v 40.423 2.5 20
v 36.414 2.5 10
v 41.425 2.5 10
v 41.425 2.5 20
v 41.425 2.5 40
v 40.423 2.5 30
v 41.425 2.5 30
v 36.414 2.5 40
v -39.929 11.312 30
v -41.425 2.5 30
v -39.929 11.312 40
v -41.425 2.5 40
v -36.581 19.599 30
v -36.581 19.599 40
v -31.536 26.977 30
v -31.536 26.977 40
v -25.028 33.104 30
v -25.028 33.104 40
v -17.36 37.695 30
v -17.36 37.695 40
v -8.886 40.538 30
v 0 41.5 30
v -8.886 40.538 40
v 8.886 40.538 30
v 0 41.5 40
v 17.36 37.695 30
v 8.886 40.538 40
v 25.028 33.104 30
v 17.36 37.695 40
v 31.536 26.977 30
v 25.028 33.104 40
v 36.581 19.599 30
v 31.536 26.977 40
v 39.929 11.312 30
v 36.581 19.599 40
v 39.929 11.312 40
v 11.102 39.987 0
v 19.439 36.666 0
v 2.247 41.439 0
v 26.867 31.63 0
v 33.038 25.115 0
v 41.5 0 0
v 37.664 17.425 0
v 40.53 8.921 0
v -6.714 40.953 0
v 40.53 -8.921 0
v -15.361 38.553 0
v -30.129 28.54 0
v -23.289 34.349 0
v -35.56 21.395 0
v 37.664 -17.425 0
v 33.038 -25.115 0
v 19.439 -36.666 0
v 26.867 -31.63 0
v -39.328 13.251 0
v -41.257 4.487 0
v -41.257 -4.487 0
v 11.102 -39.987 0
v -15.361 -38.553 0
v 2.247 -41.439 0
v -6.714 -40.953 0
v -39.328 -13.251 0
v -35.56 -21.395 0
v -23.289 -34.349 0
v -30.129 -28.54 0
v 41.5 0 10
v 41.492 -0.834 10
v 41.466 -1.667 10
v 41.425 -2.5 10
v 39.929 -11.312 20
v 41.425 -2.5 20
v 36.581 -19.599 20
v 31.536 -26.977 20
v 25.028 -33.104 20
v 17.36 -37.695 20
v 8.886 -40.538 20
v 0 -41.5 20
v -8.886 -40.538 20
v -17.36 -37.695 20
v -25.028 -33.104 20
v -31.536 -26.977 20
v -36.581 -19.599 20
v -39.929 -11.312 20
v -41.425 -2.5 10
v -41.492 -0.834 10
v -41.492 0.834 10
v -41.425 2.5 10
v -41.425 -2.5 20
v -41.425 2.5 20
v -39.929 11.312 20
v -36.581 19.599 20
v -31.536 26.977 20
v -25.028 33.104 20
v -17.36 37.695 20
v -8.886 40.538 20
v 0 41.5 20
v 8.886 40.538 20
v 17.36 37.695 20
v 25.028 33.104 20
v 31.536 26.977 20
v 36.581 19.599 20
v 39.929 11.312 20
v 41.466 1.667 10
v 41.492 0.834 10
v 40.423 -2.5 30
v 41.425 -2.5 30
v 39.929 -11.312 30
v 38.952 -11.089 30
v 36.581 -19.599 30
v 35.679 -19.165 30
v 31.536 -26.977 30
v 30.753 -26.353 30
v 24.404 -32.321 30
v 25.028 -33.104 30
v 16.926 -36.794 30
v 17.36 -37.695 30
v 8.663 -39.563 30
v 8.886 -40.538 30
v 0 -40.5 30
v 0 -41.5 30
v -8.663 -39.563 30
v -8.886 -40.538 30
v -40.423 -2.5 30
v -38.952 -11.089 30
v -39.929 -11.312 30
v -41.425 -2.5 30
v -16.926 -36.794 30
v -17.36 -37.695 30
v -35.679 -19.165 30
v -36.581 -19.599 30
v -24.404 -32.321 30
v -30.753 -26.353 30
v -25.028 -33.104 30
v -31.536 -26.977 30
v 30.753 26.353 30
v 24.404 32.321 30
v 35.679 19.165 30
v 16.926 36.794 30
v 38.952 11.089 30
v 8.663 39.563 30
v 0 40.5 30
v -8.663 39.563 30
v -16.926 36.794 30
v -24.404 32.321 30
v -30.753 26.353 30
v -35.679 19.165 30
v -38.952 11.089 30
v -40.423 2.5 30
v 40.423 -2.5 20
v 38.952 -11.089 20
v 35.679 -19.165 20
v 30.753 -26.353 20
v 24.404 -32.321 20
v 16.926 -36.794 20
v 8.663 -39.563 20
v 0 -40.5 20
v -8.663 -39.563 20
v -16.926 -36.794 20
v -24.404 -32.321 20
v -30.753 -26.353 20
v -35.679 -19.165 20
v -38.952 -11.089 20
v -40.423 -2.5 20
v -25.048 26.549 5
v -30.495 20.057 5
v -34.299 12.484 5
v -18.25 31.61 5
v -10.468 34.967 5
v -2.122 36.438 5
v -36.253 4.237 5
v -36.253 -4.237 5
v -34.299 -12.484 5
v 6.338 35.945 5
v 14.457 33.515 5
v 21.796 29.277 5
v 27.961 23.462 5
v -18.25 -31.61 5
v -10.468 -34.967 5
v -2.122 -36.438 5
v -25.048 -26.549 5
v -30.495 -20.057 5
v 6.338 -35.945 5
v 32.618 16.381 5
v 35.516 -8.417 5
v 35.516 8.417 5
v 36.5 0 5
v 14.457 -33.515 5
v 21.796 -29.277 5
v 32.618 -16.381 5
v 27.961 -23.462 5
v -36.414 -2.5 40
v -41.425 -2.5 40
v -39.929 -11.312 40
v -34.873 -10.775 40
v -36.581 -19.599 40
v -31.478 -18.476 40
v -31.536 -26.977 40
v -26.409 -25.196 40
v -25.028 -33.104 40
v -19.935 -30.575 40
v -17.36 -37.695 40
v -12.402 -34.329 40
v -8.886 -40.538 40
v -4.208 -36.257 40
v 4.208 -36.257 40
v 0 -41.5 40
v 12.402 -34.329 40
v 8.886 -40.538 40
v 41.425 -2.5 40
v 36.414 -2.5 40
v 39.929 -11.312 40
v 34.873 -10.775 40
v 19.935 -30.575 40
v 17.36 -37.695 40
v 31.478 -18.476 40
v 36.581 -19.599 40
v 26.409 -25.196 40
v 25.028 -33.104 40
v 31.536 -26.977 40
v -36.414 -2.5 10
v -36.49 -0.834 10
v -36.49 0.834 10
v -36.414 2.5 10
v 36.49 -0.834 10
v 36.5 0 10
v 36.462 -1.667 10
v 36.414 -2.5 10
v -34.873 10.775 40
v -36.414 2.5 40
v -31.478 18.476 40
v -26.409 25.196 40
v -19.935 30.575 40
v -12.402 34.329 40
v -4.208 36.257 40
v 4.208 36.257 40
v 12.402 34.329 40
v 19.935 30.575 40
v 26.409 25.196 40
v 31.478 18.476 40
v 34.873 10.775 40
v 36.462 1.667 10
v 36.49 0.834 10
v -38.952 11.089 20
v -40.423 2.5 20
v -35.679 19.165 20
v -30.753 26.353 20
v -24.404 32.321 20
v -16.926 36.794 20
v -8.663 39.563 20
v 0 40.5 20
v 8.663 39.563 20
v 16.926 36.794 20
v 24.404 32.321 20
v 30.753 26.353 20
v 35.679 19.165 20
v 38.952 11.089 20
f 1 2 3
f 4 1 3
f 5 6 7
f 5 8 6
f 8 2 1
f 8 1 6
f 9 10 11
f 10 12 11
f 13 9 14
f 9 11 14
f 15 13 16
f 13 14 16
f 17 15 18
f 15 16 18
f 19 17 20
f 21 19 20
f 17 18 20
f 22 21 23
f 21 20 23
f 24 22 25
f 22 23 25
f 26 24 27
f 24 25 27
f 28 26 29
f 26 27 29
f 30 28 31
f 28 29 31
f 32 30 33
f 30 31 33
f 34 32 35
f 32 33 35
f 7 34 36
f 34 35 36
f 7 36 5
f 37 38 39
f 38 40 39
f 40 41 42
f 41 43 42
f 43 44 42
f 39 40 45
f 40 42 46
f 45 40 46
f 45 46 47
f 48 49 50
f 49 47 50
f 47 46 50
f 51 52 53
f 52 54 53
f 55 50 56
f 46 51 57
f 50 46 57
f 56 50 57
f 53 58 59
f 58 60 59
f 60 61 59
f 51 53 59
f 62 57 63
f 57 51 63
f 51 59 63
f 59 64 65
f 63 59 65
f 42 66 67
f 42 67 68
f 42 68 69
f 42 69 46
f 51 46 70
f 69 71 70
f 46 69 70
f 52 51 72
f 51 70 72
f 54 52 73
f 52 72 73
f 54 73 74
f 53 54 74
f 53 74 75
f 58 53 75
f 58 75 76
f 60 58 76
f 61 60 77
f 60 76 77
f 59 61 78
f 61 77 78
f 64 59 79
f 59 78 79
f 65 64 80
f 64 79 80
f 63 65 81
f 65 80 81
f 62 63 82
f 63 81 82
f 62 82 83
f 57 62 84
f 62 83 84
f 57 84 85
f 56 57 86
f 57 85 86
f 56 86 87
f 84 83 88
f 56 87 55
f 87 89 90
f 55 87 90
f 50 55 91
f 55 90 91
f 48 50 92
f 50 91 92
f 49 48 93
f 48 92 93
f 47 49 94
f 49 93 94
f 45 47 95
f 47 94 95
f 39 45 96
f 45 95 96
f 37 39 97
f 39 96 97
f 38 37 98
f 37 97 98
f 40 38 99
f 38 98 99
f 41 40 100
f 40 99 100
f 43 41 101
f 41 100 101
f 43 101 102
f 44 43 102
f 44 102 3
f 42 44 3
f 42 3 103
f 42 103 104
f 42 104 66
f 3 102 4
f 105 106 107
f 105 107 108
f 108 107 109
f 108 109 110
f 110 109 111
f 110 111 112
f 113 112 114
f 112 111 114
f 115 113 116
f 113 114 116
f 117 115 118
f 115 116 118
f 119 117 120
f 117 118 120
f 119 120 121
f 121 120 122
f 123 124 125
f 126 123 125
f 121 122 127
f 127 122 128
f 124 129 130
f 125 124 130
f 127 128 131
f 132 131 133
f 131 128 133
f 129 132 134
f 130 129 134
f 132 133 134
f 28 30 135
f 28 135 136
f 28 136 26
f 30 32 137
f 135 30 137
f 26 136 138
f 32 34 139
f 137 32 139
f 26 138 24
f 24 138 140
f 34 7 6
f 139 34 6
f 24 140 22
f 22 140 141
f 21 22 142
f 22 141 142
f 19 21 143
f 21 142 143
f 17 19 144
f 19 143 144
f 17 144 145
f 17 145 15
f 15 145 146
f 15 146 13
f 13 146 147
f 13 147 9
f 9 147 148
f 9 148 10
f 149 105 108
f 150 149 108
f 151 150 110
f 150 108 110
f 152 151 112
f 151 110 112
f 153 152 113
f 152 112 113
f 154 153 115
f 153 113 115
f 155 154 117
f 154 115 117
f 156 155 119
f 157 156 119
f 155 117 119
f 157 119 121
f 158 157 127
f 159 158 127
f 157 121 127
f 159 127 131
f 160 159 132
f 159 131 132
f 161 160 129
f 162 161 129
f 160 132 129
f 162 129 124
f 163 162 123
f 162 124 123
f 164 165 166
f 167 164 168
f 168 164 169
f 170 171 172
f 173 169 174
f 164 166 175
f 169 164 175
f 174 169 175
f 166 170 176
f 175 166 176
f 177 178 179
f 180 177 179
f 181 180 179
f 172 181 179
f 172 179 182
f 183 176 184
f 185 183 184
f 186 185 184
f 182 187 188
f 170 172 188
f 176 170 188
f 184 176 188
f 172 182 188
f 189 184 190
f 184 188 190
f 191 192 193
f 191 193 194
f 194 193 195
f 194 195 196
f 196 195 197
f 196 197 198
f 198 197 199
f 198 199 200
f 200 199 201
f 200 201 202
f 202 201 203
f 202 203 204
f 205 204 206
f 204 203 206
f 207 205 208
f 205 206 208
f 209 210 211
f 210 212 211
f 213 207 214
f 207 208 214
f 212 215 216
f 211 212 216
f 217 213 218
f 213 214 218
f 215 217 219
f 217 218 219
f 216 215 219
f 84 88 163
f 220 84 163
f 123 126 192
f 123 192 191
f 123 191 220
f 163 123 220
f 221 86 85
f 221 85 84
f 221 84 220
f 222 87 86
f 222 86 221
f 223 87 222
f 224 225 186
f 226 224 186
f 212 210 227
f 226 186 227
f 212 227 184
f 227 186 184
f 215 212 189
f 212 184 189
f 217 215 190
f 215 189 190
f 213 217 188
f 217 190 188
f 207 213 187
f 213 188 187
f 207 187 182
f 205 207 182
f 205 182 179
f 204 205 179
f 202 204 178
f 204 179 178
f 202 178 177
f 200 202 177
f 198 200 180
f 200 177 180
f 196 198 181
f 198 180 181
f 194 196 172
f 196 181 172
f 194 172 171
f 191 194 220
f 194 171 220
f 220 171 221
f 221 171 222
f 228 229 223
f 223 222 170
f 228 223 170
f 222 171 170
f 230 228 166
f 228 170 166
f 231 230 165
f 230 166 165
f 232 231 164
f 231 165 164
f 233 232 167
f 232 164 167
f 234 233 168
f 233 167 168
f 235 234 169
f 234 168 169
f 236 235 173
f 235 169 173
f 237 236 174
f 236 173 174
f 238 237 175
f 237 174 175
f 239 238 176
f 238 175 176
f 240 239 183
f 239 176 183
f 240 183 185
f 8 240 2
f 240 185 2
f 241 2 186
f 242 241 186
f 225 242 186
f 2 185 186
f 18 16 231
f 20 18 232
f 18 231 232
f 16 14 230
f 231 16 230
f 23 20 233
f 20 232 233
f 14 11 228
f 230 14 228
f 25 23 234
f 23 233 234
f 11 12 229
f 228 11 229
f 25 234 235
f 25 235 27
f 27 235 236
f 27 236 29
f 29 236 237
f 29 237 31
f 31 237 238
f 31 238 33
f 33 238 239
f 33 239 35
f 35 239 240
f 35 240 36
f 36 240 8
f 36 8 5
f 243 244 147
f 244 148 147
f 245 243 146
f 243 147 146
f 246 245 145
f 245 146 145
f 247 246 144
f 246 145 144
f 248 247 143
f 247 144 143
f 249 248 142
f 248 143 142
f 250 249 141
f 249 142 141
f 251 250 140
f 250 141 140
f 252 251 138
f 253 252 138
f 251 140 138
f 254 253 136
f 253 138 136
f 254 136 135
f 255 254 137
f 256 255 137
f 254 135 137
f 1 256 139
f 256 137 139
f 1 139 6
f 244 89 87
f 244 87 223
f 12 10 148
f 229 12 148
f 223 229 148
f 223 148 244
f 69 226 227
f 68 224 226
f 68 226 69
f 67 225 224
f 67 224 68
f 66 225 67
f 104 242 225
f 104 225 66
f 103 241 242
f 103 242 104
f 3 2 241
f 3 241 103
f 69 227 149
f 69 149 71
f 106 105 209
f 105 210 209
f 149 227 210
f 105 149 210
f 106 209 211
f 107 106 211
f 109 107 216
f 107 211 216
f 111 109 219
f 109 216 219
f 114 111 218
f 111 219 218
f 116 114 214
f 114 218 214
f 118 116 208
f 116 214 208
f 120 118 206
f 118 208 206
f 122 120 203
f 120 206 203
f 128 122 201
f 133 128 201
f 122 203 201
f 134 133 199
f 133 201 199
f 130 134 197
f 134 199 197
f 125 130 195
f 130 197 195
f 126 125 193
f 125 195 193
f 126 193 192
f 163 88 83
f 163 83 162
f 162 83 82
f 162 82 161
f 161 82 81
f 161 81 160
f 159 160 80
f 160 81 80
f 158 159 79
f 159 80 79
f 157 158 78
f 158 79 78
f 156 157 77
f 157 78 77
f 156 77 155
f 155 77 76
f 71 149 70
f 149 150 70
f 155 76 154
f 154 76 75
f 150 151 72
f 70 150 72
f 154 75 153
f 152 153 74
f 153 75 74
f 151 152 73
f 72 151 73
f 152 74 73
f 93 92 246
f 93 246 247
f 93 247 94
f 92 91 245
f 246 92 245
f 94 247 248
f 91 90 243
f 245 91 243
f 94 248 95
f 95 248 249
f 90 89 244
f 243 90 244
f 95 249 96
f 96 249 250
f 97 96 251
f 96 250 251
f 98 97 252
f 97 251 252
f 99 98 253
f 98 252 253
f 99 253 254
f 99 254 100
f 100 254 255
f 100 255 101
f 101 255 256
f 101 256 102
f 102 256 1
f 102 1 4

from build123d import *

# Parameters (mm, degrees)
F2_W     = 100
F2_H     = 5
F3_DEPTH = 30


with BuildPart() as f1:
    # F0 (on Front) → F1 (revolve)
    with BuildSketch(Plane.XZ):
        Polygon((0, 5), (0, 0), (41.5, 0), (41.5, 20), (40.5, 20), (40.5, 30), (41.5, 30), (41.5, 40), (36.5, 40), (36.5, 5), align=None)
    revolve(axis=Axis((0, 0, 2.5), (0, 0, -1)))

    # F2 (on face) → F3 (cut)
    with BuildSketch(Plane.XY.offset(40)):
        Rectangle(F2_W, F2_H)
    extrude(amount=-F3_DEPTH, mode=Mode.SUBTRACT)


solid = f1.part
